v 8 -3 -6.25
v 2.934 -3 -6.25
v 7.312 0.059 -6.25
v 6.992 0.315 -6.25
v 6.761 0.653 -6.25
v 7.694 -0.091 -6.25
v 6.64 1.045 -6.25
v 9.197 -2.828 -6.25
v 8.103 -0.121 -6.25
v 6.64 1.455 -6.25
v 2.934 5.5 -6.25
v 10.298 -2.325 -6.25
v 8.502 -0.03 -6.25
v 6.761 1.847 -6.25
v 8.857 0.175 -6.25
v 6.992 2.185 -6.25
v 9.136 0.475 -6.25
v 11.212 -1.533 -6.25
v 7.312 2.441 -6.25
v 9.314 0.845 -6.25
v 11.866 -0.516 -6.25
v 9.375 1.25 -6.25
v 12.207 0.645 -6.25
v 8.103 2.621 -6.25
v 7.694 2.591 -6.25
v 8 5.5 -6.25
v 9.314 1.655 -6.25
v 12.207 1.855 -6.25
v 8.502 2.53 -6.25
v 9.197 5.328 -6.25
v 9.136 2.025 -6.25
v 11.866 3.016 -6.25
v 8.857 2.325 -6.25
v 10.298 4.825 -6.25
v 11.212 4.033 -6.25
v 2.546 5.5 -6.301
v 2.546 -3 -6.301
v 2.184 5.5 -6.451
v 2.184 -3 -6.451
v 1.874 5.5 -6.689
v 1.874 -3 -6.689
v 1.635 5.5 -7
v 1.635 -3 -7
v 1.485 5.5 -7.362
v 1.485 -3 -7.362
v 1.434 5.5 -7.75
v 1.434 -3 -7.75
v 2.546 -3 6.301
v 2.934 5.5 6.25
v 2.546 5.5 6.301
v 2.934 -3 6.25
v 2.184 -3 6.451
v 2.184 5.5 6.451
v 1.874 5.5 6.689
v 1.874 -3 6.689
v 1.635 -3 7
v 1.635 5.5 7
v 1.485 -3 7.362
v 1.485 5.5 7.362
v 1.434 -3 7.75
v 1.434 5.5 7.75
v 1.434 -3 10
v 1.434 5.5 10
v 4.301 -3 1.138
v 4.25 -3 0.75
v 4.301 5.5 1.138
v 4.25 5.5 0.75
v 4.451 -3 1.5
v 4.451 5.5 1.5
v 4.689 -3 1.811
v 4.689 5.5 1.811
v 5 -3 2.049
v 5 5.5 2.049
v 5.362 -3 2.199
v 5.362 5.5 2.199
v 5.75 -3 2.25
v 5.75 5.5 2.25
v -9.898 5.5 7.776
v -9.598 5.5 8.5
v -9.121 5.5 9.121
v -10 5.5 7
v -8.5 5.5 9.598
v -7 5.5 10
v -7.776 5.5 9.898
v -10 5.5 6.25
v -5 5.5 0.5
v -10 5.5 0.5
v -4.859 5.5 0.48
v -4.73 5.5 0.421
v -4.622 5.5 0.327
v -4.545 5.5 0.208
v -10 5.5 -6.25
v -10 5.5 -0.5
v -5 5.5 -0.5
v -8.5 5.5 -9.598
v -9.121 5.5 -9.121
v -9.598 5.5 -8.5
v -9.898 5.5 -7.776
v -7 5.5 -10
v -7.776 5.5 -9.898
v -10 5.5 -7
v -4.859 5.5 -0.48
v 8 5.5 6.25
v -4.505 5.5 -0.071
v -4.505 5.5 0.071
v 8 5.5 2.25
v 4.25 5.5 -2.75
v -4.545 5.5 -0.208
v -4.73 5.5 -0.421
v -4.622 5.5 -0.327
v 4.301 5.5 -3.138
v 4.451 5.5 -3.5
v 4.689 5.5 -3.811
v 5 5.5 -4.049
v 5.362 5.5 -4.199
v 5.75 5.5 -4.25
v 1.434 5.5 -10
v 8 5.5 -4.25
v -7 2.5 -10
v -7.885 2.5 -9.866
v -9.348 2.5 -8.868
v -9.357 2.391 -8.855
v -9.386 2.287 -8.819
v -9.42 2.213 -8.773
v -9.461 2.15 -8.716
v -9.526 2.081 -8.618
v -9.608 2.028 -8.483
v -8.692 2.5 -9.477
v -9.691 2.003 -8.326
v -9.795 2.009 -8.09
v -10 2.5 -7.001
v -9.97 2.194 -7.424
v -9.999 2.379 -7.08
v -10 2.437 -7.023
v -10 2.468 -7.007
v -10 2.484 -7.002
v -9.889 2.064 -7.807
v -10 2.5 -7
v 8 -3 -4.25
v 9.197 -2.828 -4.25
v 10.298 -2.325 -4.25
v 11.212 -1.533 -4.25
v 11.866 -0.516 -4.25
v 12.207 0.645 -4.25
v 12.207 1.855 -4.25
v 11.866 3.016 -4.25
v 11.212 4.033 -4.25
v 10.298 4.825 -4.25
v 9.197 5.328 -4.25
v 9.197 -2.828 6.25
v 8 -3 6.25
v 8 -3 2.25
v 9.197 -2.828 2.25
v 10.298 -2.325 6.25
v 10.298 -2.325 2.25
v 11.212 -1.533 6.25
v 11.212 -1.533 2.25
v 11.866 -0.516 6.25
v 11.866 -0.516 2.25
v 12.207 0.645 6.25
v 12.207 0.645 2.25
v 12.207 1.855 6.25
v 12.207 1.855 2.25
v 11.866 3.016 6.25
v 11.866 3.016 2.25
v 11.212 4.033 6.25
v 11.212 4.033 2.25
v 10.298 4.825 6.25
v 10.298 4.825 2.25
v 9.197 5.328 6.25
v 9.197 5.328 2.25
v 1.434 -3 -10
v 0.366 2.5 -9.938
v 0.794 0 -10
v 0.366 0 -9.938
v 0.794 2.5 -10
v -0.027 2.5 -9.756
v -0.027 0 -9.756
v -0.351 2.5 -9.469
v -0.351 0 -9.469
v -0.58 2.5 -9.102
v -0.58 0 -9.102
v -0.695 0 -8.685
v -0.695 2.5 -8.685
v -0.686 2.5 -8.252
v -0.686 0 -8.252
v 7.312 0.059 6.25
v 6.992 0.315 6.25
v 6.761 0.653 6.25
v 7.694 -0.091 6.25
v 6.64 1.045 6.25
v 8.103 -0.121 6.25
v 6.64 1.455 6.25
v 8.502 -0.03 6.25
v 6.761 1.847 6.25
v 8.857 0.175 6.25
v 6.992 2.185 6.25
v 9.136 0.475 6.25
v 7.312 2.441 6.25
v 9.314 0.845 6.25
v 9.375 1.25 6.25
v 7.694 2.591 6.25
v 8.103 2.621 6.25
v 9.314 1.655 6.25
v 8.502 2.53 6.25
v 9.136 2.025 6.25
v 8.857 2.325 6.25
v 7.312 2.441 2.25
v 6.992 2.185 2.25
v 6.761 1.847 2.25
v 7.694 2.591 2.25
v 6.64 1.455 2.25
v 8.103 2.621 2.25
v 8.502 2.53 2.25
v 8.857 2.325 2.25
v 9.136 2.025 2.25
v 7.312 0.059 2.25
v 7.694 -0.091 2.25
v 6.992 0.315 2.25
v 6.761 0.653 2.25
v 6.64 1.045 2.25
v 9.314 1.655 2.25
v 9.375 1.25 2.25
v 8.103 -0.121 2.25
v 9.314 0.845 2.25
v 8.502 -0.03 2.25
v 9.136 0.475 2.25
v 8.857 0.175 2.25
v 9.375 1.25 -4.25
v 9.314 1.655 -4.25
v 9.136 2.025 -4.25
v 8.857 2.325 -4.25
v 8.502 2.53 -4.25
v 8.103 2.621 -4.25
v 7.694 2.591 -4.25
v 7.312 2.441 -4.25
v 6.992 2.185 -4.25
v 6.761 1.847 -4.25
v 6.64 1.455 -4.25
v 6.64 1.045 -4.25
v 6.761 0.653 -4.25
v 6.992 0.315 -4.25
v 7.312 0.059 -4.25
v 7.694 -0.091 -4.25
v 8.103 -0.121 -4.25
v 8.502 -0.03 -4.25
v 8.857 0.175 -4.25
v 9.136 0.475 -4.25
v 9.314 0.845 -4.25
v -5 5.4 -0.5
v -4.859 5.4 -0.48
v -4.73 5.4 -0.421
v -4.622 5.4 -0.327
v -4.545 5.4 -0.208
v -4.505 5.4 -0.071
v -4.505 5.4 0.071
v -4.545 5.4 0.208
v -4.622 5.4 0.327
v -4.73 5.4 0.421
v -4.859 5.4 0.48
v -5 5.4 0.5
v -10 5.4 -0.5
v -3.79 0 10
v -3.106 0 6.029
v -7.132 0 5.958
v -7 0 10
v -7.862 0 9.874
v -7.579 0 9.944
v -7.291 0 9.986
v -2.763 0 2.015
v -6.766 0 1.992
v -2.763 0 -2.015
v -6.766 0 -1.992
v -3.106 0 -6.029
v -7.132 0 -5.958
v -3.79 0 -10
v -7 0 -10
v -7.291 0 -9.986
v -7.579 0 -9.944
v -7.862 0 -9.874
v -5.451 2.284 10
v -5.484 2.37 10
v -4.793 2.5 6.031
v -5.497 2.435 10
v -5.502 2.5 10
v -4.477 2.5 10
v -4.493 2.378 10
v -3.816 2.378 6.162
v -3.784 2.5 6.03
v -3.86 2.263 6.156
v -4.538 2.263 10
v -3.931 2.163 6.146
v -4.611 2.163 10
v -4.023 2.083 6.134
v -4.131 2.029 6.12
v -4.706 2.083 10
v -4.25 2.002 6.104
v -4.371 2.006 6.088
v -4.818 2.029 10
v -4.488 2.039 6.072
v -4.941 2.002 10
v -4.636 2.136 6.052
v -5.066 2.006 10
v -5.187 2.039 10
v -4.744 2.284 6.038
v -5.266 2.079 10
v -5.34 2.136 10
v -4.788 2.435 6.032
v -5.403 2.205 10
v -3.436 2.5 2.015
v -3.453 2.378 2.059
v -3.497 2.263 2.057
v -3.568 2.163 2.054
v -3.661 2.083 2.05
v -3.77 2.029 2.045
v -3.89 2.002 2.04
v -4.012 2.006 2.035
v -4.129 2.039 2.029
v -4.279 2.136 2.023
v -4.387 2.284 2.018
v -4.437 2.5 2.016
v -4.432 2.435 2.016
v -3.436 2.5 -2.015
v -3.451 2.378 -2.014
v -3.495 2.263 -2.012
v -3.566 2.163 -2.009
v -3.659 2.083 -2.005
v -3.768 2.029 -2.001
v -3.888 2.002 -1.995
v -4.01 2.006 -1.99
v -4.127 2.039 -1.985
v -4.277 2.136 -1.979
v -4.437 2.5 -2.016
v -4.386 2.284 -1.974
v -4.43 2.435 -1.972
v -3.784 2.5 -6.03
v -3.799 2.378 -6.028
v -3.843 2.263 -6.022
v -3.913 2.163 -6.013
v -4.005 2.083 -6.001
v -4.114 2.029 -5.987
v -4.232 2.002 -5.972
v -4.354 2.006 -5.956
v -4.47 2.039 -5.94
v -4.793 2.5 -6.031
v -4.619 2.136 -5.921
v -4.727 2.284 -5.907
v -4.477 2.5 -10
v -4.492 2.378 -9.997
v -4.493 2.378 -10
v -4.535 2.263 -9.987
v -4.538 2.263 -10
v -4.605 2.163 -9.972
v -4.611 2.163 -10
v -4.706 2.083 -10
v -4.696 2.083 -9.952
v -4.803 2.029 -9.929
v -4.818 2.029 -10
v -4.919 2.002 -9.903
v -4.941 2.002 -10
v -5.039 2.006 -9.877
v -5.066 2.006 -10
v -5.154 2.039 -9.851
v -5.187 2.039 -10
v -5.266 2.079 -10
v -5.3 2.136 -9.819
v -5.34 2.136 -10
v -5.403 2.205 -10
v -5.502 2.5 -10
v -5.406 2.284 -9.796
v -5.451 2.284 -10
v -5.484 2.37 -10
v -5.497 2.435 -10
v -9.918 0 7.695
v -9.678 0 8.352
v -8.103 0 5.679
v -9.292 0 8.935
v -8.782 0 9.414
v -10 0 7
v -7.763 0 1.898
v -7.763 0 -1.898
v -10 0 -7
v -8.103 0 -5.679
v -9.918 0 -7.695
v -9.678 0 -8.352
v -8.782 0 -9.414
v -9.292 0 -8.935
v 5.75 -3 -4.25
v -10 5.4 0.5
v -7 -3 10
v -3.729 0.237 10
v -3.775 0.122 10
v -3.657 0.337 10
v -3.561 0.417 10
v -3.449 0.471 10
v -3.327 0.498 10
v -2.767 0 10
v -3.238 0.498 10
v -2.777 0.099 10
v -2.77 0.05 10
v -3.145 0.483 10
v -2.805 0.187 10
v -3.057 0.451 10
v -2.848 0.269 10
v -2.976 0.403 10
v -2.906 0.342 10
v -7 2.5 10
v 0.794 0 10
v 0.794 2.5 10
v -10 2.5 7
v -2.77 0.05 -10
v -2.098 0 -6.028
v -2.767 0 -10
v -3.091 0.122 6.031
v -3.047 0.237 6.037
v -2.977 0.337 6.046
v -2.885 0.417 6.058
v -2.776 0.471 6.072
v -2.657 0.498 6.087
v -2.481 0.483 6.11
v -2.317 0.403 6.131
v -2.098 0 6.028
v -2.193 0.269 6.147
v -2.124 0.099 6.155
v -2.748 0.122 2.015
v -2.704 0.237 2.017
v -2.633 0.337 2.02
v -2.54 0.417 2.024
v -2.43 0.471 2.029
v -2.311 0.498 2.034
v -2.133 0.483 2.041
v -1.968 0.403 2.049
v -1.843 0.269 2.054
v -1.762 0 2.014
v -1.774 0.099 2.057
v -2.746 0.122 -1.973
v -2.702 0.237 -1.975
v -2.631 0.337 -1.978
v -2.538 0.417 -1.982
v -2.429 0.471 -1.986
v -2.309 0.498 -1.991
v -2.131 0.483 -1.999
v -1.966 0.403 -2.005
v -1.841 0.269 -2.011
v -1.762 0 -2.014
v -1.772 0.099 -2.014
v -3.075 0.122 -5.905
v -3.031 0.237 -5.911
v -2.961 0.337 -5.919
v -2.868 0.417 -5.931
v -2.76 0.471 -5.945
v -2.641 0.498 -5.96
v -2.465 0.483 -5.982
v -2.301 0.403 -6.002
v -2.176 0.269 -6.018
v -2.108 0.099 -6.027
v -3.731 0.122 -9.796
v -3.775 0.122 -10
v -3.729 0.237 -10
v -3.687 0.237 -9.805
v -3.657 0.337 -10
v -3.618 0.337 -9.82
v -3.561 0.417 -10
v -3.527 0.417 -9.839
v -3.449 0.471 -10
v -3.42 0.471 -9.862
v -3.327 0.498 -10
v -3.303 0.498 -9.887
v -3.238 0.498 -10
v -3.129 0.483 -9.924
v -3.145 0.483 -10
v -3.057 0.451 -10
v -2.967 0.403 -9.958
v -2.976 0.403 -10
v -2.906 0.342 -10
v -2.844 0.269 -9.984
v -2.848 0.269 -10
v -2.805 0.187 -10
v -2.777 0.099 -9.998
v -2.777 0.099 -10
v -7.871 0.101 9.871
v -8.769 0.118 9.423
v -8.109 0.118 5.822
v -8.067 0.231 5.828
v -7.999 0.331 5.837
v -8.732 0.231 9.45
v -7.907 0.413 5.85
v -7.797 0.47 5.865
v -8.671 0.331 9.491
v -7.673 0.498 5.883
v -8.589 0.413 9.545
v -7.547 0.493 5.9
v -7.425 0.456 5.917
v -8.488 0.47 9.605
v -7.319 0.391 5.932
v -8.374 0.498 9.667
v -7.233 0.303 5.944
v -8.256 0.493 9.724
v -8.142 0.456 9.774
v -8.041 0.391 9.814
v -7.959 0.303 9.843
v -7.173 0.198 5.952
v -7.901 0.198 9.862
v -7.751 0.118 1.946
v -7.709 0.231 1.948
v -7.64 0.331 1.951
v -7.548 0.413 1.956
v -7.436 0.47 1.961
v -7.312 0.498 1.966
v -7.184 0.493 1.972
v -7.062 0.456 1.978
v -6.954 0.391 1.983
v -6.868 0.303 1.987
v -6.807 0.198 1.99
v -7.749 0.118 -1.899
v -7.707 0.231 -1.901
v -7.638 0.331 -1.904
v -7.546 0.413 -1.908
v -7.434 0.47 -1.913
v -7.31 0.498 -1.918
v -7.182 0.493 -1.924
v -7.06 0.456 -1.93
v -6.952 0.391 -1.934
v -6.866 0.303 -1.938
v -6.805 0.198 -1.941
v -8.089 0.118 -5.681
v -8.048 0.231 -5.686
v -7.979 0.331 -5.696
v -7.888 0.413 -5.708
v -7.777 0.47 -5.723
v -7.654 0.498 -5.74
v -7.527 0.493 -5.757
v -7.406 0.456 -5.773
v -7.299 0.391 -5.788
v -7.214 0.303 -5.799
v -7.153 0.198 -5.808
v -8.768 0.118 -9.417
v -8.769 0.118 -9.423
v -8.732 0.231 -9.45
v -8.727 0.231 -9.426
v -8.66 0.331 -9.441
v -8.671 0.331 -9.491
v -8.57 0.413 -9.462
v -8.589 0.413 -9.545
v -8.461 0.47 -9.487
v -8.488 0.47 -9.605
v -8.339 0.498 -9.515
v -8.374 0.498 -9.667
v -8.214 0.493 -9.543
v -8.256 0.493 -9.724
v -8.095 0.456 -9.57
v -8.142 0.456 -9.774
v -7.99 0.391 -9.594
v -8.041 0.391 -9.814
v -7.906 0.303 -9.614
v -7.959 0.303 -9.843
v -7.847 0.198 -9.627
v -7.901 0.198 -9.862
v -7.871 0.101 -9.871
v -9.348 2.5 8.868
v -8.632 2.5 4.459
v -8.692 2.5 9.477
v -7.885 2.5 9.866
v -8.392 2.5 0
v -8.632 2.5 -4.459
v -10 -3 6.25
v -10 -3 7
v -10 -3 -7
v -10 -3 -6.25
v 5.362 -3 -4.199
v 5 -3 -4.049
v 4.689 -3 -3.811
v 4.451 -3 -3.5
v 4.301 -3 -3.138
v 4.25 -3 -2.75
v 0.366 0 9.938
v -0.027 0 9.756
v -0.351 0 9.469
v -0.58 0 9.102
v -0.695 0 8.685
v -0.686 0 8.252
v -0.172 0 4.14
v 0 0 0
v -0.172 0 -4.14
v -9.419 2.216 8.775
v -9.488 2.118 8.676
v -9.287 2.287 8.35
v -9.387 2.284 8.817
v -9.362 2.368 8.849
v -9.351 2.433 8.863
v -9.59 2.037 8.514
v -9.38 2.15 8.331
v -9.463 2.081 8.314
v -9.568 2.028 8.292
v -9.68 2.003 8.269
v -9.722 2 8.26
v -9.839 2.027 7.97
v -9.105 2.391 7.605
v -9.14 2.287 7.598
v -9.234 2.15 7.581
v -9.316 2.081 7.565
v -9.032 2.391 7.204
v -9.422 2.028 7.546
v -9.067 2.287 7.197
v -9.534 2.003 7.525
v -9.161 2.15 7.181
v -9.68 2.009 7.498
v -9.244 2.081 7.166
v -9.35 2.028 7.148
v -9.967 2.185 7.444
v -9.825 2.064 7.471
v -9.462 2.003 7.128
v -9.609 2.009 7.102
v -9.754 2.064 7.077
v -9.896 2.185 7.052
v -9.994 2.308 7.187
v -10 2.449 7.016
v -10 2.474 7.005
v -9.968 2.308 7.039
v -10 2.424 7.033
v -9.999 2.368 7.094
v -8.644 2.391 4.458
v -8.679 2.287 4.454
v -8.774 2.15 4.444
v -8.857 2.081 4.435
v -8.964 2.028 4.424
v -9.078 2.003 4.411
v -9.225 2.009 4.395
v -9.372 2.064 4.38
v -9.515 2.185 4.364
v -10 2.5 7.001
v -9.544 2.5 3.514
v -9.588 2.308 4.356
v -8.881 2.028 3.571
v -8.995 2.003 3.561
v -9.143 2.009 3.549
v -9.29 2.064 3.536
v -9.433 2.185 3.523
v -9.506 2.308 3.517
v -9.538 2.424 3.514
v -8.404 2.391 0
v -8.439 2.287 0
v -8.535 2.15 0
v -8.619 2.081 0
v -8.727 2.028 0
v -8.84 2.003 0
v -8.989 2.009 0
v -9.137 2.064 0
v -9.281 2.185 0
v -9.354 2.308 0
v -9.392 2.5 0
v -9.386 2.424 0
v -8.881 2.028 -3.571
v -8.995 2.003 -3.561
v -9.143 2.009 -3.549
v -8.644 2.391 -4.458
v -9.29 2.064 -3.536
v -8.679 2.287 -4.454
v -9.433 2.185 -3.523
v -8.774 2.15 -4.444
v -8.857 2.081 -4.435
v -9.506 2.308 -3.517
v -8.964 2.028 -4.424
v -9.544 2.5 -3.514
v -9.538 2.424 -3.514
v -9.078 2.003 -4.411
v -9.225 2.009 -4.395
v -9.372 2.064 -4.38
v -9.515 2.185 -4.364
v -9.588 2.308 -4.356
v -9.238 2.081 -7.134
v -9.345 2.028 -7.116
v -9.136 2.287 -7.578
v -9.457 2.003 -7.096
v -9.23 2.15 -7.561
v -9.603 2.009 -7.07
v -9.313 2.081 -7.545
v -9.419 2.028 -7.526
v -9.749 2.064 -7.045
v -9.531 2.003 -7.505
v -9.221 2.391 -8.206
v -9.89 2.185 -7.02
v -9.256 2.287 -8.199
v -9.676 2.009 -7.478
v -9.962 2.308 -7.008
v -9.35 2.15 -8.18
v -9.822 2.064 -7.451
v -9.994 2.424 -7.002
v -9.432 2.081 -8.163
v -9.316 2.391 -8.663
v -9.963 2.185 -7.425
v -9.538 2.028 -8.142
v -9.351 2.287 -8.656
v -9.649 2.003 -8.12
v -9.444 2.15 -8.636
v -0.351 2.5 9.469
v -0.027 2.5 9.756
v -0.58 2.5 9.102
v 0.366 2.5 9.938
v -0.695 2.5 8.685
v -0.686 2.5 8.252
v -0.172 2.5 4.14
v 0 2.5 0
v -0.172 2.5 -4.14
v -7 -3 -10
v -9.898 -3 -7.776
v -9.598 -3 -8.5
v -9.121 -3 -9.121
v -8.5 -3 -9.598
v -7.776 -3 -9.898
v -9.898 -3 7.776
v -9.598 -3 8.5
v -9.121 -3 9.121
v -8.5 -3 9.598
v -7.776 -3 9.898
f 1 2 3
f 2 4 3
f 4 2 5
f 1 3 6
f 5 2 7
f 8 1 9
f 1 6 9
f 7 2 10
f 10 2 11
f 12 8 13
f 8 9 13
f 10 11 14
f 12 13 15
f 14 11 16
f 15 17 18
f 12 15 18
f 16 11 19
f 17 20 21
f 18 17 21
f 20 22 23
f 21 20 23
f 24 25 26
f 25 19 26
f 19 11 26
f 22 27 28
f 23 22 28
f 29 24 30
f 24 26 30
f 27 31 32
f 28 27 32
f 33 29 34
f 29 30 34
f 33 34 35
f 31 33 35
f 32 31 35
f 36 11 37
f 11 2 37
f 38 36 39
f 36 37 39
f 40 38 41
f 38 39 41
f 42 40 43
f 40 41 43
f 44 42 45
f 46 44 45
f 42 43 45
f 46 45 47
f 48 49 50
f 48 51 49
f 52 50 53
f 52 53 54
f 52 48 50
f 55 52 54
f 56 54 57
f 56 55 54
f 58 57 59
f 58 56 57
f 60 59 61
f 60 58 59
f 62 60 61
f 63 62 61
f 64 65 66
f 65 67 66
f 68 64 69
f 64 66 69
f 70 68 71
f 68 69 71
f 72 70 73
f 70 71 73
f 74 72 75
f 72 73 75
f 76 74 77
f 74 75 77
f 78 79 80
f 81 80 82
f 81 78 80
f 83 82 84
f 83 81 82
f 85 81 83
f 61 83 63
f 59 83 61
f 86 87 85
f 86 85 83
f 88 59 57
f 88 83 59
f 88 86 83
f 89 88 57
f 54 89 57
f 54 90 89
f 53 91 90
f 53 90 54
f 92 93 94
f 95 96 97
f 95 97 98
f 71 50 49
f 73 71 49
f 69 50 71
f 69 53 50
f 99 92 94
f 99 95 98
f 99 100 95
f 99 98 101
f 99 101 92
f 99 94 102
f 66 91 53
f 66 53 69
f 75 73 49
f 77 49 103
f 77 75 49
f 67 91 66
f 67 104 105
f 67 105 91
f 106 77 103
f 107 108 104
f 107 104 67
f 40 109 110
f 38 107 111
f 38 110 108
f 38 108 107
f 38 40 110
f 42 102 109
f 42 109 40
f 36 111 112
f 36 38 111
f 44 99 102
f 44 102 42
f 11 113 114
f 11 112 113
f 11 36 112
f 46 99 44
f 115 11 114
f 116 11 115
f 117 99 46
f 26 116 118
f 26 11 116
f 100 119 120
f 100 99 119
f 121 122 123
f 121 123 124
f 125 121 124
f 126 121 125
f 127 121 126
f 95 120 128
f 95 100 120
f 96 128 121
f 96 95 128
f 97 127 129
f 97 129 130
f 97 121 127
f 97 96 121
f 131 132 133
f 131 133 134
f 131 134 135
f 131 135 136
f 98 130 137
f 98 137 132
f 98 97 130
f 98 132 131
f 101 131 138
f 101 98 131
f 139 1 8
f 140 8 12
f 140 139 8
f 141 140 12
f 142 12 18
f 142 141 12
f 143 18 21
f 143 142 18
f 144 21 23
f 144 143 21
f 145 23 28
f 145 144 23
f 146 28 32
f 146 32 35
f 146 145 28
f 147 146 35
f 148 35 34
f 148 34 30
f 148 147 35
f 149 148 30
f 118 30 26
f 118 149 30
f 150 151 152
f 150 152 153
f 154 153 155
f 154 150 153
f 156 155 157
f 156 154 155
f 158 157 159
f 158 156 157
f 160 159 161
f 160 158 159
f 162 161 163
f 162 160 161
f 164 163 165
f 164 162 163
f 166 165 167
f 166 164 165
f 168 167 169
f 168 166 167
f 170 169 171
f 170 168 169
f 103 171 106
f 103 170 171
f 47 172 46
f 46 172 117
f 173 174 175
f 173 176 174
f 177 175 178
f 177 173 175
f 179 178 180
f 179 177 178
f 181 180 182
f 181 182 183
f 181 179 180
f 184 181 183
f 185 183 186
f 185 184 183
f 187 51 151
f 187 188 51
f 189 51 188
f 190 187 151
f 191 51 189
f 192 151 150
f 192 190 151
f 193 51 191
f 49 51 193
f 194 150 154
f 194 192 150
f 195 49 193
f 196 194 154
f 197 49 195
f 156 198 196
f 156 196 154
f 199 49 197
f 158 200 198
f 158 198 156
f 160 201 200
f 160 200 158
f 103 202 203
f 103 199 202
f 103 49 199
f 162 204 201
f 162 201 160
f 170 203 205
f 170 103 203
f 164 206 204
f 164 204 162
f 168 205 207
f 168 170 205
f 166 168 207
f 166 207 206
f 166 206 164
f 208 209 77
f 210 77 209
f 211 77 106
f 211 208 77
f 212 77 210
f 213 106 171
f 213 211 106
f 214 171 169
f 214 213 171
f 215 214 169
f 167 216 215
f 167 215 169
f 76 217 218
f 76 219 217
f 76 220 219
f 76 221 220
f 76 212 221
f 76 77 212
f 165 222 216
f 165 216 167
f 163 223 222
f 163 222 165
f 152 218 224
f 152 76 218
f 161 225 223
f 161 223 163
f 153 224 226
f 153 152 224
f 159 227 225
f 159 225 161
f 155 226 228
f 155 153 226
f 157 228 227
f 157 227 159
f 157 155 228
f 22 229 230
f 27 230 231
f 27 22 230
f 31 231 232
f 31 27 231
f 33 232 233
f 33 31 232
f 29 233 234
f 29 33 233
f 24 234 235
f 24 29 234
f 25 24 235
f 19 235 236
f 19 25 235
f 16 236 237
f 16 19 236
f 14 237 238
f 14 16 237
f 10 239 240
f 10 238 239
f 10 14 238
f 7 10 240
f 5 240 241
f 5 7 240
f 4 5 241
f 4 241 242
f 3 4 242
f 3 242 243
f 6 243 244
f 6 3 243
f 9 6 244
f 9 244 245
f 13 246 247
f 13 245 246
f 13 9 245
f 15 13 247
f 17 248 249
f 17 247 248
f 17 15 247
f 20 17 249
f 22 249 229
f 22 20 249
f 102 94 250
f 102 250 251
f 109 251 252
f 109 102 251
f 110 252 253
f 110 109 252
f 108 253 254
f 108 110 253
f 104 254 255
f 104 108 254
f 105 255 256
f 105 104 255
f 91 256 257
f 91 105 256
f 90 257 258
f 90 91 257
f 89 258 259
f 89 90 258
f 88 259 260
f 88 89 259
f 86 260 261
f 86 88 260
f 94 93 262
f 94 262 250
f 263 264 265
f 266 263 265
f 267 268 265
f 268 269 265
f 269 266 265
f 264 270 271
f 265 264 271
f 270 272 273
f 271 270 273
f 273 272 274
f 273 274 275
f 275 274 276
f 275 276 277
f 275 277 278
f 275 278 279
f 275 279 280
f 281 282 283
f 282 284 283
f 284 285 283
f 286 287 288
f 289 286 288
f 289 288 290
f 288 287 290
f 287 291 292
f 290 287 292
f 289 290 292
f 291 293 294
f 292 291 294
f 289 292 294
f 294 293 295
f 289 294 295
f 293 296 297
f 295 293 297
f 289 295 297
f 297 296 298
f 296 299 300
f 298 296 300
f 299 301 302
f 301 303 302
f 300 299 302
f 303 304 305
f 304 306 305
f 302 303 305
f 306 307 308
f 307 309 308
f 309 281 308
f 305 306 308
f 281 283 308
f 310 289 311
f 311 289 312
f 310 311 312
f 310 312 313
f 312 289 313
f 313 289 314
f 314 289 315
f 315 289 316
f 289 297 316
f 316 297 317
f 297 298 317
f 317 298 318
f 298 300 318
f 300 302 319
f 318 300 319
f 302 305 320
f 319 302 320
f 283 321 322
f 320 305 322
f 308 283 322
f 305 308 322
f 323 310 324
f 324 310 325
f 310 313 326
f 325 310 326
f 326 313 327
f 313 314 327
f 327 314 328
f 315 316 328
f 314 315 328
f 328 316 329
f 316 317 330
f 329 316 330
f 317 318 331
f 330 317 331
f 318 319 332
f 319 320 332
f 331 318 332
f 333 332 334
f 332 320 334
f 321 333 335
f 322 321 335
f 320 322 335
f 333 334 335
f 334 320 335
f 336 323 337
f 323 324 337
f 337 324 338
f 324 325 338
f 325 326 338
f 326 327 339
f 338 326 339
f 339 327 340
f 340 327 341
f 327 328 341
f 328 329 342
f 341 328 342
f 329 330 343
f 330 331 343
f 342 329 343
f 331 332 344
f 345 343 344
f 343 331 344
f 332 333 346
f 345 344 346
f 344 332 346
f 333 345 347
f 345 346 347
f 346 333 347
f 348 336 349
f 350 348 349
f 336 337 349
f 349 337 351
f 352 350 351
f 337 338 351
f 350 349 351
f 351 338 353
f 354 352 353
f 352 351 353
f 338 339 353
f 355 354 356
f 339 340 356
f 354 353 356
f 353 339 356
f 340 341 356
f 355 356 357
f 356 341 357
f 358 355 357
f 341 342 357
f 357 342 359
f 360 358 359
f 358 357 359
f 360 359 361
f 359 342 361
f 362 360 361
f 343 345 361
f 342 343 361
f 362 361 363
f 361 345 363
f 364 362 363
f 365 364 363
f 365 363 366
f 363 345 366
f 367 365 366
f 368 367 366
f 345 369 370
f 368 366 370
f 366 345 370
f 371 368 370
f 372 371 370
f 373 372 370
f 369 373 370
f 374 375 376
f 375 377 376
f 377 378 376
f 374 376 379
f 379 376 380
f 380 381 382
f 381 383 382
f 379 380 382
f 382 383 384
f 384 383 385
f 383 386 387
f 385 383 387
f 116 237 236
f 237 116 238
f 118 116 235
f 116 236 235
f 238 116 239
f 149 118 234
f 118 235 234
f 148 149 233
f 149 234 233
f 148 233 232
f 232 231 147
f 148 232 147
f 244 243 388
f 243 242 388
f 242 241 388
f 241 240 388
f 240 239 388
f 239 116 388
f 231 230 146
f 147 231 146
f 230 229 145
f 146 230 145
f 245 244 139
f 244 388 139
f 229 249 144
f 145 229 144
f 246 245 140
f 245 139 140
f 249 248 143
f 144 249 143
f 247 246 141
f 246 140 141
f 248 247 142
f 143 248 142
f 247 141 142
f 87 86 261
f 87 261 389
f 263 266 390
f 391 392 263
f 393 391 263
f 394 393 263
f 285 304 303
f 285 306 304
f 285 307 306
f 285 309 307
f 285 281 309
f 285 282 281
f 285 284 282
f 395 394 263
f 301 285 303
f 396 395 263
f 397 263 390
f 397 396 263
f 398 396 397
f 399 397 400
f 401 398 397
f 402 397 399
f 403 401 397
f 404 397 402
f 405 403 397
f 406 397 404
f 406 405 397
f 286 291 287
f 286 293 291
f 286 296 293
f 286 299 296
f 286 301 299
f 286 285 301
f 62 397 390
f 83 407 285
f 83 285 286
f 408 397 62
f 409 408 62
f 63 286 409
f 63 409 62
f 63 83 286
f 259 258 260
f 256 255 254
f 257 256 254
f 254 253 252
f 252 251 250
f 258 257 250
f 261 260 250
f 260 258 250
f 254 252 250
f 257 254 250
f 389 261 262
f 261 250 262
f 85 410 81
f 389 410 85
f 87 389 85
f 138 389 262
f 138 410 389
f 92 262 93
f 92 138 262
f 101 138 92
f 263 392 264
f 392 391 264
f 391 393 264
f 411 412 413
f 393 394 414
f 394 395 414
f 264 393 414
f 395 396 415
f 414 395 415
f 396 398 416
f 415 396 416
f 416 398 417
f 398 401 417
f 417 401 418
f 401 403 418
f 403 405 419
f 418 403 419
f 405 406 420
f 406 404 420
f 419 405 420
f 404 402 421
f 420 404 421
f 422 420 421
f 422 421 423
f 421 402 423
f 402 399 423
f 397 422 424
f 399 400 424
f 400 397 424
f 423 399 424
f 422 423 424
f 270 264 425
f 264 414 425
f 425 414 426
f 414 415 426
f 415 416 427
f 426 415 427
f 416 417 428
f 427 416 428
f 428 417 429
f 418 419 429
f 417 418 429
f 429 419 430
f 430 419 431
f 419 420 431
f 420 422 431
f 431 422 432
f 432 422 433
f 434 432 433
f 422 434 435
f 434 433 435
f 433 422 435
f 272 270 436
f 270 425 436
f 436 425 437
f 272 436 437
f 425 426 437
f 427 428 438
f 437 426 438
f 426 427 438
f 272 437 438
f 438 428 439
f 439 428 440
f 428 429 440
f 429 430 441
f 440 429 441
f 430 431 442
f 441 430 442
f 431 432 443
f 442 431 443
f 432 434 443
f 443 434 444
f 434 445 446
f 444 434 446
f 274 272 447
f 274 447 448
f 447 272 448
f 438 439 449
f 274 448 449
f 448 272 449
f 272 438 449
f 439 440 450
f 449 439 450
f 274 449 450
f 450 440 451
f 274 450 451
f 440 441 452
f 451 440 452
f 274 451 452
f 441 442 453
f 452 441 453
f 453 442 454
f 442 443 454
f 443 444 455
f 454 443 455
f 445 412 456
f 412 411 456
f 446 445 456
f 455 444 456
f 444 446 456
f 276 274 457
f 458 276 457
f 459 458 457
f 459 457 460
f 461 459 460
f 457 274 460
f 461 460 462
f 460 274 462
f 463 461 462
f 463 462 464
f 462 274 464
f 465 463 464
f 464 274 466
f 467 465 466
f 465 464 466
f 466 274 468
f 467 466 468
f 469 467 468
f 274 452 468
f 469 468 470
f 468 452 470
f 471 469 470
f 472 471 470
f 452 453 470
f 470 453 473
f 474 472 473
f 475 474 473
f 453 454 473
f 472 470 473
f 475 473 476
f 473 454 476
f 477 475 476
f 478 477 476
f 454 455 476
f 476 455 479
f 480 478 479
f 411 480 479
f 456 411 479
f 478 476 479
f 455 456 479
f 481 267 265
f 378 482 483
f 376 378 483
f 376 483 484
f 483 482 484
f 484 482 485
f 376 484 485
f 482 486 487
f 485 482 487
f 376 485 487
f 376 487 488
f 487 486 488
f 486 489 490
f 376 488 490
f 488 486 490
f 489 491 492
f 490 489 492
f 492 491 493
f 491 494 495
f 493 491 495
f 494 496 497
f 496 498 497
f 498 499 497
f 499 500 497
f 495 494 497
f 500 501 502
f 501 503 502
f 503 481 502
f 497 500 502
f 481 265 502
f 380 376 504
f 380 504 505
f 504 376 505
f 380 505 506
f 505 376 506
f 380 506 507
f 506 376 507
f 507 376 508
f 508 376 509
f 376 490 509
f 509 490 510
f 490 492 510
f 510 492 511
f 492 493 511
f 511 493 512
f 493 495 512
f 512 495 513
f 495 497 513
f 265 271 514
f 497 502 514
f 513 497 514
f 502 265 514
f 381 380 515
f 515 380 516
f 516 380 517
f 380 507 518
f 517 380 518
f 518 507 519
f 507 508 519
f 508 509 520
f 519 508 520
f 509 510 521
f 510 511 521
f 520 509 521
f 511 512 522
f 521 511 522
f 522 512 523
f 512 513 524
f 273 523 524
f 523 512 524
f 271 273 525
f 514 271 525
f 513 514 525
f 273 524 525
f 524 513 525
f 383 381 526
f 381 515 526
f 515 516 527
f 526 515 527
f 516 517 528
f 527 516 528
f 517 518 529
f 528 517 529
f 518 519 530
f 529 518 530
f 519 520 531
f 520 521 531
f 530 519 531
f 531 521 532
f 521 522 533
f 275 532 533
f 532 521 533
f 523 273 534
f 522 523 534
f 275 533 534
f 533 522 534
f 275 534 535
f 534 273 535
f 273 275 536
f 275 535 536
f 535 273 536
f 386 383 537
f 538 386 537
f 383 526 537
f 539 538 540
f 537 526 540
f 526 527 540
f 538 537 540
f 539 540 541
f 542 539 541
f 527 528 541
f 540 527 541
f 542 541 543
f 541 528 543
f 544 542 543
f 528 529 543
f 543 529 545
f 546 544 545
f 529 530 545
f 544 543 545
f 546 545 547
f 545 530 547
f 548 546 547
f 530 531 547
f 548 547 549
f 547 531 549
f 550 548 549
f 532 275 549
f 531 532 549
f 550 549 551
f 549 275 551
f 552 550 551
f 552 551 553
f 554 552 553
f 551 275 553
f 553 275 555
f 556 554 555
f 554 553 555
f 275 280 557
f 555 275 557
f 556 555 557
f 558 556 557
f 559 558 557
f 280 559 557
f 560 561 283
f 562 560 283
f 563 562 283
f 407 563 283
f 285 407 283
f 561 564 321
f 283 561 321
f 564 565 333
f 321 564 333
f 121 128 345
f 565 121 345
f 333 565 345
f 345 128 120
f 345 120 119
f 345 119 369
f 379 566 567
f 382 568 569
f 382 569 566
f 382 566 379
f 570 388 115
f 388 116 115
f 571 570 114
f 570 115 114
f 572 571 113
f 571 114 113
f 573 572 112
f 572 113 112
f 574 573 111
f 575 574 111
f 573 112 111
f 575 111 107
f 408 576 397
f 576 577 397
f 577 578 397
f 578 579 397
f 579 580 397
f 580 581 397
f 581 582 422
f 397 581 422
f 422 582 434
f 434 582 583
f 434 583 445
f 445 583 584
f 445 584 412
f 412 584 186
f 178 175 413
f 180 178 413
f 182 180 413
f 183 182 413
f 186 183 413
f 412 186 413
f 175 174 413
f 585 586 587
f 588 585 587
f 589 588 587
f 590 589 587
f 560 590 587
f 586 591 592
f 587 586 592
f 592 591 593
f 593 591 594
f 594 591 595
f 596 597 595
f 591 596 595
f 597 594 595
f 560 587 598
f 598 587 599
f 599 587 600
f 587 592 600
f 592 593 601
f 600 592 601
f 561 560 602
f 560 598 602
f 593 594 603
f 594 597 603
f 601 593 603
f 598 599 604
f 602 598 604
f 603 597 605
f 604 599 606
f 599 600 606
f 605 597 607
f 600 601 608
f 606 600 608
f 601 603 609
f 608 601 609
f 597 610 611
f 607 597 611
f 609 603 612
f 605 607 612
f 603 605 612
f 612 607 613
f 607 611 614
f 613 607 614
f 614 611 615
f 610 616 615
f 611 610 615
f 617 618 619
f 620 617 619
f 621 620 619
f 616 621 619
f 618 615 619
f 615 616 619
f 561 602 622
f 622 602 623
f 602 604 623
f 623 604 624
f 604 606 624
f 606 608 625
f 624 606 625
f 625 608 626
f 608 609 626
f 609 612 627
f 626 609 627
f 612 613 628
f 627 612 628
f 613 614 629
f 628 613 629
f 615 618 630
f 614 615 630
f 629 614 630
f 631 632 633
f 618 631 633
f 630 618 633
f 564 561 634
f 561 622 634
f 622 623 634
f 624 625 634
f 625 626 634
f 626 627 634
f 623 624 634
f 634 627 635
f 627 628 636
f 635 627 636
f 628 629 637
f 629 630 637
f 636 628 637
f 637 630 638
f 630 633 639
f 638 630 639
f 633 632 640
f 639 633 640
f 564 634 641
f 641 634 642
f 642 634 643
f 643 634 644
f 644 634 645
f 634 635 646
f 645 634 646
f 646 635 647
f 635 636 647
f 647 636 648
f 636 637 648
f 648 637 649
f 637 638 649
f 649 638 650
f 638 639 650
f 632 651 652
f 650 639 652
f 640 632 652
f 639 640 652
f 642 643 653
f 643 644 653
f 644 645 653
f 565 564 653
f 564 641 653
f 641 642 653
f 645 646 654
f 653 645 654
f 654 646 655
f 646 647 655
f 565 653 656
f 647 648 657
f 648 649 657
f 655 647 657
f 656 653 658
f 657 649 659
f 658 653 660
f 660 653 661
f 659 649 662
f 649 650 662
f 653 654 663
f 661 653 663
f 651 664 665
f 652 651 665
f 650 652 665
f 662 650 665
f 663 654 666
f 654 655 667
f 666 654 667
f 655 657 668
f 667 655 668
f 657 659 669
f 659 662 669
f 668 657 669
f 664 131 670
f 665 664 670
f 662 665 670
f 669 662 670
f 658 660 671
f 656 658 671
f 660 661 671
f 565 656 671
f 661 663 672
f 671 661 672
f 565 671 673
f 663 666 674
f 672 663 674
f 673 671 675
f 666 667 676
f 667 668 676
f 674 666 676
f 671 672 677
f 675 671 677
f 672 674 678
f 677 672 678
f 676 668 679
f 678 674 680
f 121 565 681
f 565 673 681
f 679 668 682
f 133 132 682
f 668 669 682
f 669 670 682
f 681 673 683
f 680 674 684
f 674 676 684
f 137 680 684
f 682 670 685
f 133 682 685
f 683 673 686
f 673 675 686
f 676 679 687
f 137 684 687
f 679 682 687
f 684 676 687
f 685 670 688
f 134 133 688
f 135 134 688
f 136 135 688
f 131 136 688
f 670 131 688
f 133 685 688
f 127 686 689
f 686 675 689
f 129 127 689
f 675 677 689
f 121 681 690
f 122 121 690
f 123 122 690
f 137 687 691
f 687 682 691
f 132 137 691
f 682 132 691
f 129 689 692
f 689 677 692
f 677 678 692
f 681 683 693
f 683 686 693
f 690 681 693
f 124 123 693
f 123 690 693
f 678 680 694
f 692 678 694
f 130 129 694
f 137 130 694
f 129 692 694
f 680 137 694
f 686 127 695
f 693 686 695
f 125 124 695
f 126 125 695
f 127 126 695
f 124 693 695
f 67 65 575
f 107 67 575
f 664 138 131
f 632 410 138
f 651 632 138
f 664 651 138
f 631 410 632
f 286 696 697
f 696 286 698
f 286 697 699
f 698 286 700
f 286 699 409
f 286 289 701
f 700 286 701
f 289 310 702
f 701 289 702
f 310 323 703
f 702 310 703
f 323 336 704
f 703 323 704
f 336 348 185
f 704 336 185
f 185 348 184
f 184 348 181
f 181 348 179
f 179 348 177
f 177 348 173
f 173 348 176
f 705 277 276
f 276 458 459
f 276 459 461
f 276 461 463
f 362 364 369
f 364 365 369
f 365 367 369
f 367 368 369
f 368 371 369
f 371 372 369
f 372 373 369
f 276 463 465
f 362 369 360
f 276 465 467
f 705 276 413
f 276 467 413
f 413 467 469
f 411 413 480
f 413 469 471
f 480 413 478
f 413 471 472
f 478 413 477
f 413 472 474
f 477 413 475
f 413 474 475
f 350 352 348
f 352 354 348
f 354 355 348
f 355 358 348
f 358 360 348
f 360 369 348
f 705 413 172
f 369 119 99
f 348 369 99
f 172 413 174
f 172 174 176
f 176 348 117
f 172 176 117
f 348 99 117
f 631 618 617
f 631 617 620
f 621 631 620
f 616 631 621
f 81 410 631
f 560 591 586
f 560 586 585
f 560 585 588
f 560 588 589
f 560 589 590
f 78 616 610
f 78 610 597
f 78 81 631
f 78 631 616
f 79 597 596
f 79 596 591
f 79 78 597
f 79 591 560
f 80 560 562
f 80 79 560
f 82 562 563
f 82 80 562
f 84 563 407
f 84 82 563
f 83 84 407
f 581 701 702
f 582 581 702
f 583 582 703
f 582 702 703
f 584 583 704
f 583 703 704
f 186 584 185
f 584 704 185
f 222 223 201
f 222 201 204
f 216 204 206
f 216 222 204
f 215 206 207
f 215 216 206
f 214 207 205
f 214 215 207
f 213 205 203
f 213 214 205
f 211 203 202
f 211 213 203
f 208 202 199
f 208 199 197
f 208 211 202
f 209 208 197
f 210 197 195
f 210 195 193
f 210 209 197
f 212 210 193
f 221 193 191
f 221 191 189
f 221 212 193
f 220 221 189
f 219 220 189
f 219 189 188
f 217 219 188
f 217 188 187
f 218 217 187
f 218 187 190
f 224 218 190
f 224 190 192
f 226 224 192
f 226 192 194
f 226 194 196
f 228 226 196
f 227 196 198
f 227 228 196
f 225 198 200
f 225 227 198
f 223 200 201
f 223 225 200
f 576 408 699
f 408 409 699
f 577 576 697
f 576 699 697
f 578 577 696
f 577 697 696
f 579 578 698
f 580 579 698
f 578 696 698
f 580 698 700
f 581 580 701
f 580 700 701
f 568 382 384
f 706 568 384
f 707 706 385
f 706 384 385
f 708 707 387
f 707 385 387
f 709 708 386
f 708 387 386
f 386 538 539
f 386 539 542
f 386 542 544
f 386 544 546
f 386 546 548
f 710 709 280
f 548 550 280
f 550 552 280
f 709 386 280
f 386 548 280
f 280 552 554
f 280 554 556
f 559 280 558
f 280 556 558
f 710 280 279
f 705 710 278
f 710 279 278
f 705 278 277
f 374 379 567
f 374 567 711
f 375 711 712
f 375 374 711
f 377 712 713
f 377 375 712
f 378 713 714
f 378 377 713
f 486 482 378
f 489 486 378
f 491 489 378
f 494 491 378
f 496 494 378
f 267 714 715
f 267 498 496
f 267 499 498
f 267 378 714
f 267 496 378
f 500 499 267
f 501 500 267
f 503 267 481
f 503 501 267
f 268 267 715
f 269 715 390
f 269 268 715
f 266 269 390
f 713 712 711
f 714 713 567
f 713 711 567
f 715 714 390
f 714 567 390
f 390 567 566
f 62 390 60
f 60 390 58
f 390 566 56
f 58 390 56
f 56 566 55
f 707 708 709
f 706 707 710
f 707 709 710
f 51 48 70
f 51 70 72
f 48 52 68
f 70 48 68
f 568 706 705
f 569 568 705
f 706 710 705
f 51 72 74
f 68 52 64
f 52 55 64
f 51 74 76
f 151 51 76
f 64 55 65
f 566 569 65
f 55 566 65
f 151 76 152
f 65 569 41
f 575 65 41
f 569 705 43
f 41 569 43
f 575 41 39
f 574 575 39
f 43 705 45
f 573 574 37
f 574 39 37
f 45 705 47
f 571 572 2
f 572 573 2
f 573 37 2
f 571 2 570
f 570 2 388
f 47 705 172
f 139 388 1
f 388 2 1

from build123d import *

# Parameters (mm, degrees)
SKETCH1_R               = 1.375
BOSS_EXTRUDE1_DEPTH     = 6.25
CUT_EXTRUDE1_DEPTH      = 15.811313244
CUT_EXTRUDE1_DEPTH_BACK = 15.811313244
SKETCH2_W               = 8
SKETCH2_H               = 6.5
BOSS_EXTRUDE2_START     = -10
BOSS_EXTRUDE2_OUTLINE_W = 11.434309127
BOSS_EXTRUDE2_OUTLINE_H = 8.5
BOSS_EXTRUDE2_DEPTH     = 20
FILLET4_R               = 1.5
FILLET5_R               = 1.5
FILLET6_R               = 3
CUT_EXTRUDE2_DEPTH      = 0.1


# Read off the part's stored shape, not the designer's step: Boss-Extrude2
with BuildPart() as part:
    # Sketch1 → Boss-Extrude1 (new, symmetric)
    with BuildSketch(Plane.XY):
        with BuildLine():
            Line((-10, 5.5), (-10, -3))
            Line((-10, -3), (8, -3))
            ThreePointArc((8, -3), (12.25, 1.25), (8, 5.5))
            Line((8, 5.5), (-10, 5.5))
        make_face()
        with Locations((8, 1.25)):
            Circle(SKETCH1_R, mode=Mode.SUBTRACT)
    extrude(amount=BOSS_EXTRUDE1_DEPTH, both=True)

    # Sketch2 → Cut-Extrude1 (cut, two sides: drawn at the far end of the back side and taken through both)
    with BuildSketch(Plane(origin=(0, 0, 0), x_dir=(1, 0, 0), z_dir=(0, 1, 0)).offset(-CUT_EXTRUDE1_DEPTH_BACK)):
        with Locations((8.25, 1)):
            Rectangle(SKETCH2_W, SKETCH2_H)
    extrude(amount=CUT_EXTRUDE1_DEPTH + CUT_EXTRUDE1_DEPTH_BACK, mode=Mode.SUBTRACT)

    # Boss-Extrude2 outline → Boss-Extrude2 (add)
    with BuildSketch(Plane.XY.offset(BOSS_EXTRUDE2_START)):
        with Locations((-4.282845436, 1.25)):
            Rectangle(BOSS_EXTRUDE2_OUTLINE_W, BOSS_EXTRUDE2_OUTLINE_H)
    extrude(amount=BOSS_EXTRUDE2_DEPTH)

    # Sketch1<5> → Cut-Revolve2 (revolve, cut)
    with BuildSketch(Plane.XY):
        with BuildLine():
            Line((-9.391951793, 2.5), (-10, 2.5))
            Line((-10, 2.5), (-10, 0))
            Line((-10, 0), (-7.720367157, 0))
            ThreePointArc((-7.720367157, 0), (-7.220367157, 0.5), (-6.720367157, 0))
            Line((-6.720367157, 0), (-2.720367157, 0))
            ThreePointArc((-2.720367157, 0), (-2.220367157, 0.5), (-1.720367157, 0))
            Line((-1.720367157, 0), (0, 0))
            Line((0, 0), (0, 2.5))
            Line((0, 2.5), (-3.391951793, 2.5))
            ThreePointArc((-3.391951793, 2.5), (-3.891951793, 2), (-4.391951793, 2.5))
            Line((-4.391951793, 2.5), (-8.391951793, 2.5))
            ThreePointArc((-8.391951793, 2.5), (-8.891951793, 2), (-9.391951793, 2.5))
        make_face()
    revolve(axis=Axis((-50, 0, 0), (0, 1, 0)), mode=Mode.SUBTRACT)

    # Fillet4
    fillet4_edges = [part.edges().sort_by_distance(p)[0] for p in [
        (4.25, 1.25, 2.25),
        (4.25, 1.25, -4.25),
    ]]
    fillet(fillet4_edges, radius=FILLET4_R)

    # Fillet5
    fillet5_edges = [part.edges().sort_by_distance(p)[0] for p in [
        (1.434309127, 1.25, -6.25),
        (1.434309127, 1.25, 6.25),
        (-1.010205144, 1.25, 10),
        (-1.010205144, 1.25, -10),
    ]]
    fillet(fillet5_edges, radius=FILLET5_R)

    # Fillet6
    fillet6_edges = [part.edges().sort_by_distance(p)[0] for p in [
        (-10, -1.5, -10),
        (-10, 3.757683564, -10),
        (-10, -1.5, 10),
        (-10, 3.757683564, 10),
    ]]
    fillet(fillet6_edges, radius=FILLET6_R)

    # Sketch5 → Cut-Extrude2 (cut)
    with BuildSketch(Plane(origin=(0, 5.5, 0), x_dir=(1, 0, 0), z_dir=(0, 1, 0))):
        with BuildLine():
            Line((-10, 0.5), (-5, 0.5))
            ThreePointArc((-5, 0.5), (-4.5, 0), (-5, -0.5))
            Line((-5, -0.5), (-10, -0.5))
            Line((-10, -0.5), (-10, 0.5))
        make_face()
    extrude(amount=-CUT_EXTRUDE2_DEPTH, mode=Mode.SUBTRACT)


solid = part.part
